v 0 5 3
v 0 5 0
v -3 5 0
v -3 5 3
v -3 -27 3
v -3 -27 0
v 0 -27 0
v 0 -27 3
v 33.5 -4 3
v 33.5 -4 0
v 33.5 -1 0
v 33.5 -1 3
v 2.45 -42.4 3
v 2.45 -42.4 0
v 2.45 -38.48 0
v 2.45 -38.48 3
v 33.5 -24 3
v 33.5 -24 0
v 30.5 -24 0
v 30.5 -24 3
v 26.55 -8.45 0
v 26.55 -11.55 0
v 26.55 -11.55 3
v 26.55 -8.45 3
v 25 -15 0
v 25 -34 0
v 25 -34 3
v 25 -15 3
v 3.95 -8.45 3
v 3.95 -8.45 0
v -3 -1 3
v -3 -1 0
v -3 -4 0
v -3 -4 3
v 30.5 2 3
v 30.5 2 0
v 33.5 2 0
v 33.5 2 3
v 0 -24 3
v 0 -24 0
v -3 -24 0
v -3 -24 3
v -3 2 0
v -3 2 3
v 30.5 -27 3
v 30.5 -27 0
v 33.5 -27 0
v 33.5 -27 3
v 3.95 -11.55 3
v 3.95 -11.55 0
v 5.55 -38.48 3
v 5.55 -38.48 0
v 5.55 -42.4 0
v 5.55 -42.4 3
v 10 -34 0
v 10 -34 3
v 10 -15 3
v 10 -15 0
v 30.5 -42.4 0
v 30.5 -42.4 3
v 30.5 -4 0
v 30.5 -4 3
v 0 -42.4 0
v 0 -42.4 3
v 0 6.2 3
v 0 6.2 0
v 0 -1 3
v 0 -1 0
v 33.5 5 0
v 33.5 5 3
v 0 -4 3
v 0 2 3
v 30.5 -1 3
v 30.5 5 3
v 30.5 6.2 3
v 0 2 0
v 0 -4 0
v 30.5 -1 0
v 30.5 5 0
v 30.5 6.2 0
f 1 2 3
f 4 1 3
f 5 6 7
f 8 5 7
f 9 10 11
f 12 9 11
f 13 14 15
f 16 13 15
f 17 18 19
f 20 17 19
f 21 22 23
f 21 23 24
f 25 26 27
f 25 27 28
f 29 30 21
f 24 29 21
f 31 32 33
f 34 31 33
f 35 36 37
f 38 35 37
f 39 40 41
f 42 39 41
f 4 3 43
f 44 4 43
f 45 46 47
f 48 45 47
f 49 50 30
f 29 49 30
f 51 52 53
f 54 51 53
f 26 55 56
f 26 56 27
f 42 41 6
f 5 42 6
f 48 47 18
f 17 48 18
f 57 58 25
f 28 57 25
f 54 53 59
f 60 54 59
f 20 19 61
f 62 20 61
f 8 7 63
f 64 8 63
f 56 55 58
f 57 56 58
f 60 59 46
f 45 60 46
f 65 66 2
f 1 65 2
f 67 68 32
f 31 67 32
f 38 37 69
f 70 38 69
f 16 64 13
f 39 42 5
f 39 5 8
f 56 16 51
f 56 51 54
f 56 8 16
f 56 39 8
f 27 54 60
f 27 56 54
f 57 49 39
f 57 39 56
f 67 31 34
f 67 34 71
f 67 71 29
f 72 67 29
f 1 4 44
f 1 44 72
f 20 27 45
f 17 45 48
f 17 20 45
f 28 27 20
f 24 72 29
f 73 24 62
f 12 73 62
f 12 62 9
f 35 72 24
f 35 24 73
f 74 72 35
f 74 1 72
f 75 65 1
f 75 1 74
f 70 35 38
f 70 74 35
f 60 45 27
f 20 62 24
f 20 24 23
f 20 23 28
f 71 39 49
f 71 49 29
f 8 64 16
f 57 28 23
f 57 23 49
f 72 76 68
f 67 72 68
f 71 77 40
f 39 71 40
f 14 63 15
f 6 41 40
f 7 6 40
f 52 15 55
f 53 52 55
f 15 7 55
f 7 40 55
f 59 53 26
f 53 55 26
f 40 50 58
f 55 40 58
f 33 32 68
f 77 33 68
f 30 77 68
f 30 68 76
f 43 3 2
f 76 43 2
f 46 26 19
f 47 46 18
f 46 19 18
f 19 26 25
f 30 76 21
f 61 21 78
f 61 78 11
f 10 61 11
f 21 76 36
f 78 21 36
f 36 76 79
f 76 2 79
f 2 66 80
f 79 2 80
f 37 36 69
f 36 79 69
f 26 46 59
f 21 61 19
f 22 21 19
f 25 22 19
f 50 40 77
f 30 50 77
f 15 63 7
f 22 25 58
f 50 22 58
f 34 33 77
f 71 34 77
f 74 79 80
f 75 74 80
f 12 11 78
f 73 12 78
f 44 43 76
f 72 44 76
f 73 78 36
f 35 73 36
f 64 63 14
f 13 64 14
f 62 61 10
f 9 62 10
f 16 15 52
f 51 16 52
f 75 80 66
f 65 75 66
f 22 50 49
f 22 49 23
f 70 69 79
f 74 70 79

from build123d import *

# Parameters (mm, degrees)
PROFILE_LASER_PROFILE_3MM_W   = 22.6
PROFILE_LASER_PROFILE_3MM_H   = 3.1
PROFILE_LASER_PROFILE_3MM_W_2 = 15
PROFILE_LASER_PROFILE_3MM_H_2 = 19
LASER_PROFILE_3MM_DEPTH       = 3


with BuildPart() as part:
    # Profile_Laser_profile_3mm → Laser_profile_3mm (new body)
    with BuildSketch(Plane.XY):
        Polygon((0, -42.4), (2.45, -42.4), (2.45, -38.48), (5.55, -38.48), (5.55, -42.4), (30.5, -42.4), (30.5, -27), (33.5, -27), (33.5, -24), (30.5, -24), (30.5, -4), (33.5, -4), (33.5, -1), (30.5, -1), (30.5, 2), (33.5, 2), (33.5, 5), (30.5, 5), (30.5, 6.2), (0, 6.2), (0, 5), (-3, 5), (-3, 2), (0, 2), (0, -1), (-3, -1), (-3, -4), (0, -4), (0, -24), (-3, -24), (-3, -27), (0, -27), align=None)
        with Locations((15.25, -10)):
            Rectangle(PROFILE_LASER_PROFILE_3MM_W, PROFILE_LASER_PROFILE_3MM_H, mode=Mode.SUBTRACT)
        with Locations((17.5, -24.5)):
            Rectangle(PROFILE_LASER_PROFILE_3MM_W_2, PROFILE_LASER_PROFILE_3MM_H_2, mode=Mode.SUBTRACT)
    extrude(amount=LASER_PROFILE_3MM_DEPTH)


solid = part.part
